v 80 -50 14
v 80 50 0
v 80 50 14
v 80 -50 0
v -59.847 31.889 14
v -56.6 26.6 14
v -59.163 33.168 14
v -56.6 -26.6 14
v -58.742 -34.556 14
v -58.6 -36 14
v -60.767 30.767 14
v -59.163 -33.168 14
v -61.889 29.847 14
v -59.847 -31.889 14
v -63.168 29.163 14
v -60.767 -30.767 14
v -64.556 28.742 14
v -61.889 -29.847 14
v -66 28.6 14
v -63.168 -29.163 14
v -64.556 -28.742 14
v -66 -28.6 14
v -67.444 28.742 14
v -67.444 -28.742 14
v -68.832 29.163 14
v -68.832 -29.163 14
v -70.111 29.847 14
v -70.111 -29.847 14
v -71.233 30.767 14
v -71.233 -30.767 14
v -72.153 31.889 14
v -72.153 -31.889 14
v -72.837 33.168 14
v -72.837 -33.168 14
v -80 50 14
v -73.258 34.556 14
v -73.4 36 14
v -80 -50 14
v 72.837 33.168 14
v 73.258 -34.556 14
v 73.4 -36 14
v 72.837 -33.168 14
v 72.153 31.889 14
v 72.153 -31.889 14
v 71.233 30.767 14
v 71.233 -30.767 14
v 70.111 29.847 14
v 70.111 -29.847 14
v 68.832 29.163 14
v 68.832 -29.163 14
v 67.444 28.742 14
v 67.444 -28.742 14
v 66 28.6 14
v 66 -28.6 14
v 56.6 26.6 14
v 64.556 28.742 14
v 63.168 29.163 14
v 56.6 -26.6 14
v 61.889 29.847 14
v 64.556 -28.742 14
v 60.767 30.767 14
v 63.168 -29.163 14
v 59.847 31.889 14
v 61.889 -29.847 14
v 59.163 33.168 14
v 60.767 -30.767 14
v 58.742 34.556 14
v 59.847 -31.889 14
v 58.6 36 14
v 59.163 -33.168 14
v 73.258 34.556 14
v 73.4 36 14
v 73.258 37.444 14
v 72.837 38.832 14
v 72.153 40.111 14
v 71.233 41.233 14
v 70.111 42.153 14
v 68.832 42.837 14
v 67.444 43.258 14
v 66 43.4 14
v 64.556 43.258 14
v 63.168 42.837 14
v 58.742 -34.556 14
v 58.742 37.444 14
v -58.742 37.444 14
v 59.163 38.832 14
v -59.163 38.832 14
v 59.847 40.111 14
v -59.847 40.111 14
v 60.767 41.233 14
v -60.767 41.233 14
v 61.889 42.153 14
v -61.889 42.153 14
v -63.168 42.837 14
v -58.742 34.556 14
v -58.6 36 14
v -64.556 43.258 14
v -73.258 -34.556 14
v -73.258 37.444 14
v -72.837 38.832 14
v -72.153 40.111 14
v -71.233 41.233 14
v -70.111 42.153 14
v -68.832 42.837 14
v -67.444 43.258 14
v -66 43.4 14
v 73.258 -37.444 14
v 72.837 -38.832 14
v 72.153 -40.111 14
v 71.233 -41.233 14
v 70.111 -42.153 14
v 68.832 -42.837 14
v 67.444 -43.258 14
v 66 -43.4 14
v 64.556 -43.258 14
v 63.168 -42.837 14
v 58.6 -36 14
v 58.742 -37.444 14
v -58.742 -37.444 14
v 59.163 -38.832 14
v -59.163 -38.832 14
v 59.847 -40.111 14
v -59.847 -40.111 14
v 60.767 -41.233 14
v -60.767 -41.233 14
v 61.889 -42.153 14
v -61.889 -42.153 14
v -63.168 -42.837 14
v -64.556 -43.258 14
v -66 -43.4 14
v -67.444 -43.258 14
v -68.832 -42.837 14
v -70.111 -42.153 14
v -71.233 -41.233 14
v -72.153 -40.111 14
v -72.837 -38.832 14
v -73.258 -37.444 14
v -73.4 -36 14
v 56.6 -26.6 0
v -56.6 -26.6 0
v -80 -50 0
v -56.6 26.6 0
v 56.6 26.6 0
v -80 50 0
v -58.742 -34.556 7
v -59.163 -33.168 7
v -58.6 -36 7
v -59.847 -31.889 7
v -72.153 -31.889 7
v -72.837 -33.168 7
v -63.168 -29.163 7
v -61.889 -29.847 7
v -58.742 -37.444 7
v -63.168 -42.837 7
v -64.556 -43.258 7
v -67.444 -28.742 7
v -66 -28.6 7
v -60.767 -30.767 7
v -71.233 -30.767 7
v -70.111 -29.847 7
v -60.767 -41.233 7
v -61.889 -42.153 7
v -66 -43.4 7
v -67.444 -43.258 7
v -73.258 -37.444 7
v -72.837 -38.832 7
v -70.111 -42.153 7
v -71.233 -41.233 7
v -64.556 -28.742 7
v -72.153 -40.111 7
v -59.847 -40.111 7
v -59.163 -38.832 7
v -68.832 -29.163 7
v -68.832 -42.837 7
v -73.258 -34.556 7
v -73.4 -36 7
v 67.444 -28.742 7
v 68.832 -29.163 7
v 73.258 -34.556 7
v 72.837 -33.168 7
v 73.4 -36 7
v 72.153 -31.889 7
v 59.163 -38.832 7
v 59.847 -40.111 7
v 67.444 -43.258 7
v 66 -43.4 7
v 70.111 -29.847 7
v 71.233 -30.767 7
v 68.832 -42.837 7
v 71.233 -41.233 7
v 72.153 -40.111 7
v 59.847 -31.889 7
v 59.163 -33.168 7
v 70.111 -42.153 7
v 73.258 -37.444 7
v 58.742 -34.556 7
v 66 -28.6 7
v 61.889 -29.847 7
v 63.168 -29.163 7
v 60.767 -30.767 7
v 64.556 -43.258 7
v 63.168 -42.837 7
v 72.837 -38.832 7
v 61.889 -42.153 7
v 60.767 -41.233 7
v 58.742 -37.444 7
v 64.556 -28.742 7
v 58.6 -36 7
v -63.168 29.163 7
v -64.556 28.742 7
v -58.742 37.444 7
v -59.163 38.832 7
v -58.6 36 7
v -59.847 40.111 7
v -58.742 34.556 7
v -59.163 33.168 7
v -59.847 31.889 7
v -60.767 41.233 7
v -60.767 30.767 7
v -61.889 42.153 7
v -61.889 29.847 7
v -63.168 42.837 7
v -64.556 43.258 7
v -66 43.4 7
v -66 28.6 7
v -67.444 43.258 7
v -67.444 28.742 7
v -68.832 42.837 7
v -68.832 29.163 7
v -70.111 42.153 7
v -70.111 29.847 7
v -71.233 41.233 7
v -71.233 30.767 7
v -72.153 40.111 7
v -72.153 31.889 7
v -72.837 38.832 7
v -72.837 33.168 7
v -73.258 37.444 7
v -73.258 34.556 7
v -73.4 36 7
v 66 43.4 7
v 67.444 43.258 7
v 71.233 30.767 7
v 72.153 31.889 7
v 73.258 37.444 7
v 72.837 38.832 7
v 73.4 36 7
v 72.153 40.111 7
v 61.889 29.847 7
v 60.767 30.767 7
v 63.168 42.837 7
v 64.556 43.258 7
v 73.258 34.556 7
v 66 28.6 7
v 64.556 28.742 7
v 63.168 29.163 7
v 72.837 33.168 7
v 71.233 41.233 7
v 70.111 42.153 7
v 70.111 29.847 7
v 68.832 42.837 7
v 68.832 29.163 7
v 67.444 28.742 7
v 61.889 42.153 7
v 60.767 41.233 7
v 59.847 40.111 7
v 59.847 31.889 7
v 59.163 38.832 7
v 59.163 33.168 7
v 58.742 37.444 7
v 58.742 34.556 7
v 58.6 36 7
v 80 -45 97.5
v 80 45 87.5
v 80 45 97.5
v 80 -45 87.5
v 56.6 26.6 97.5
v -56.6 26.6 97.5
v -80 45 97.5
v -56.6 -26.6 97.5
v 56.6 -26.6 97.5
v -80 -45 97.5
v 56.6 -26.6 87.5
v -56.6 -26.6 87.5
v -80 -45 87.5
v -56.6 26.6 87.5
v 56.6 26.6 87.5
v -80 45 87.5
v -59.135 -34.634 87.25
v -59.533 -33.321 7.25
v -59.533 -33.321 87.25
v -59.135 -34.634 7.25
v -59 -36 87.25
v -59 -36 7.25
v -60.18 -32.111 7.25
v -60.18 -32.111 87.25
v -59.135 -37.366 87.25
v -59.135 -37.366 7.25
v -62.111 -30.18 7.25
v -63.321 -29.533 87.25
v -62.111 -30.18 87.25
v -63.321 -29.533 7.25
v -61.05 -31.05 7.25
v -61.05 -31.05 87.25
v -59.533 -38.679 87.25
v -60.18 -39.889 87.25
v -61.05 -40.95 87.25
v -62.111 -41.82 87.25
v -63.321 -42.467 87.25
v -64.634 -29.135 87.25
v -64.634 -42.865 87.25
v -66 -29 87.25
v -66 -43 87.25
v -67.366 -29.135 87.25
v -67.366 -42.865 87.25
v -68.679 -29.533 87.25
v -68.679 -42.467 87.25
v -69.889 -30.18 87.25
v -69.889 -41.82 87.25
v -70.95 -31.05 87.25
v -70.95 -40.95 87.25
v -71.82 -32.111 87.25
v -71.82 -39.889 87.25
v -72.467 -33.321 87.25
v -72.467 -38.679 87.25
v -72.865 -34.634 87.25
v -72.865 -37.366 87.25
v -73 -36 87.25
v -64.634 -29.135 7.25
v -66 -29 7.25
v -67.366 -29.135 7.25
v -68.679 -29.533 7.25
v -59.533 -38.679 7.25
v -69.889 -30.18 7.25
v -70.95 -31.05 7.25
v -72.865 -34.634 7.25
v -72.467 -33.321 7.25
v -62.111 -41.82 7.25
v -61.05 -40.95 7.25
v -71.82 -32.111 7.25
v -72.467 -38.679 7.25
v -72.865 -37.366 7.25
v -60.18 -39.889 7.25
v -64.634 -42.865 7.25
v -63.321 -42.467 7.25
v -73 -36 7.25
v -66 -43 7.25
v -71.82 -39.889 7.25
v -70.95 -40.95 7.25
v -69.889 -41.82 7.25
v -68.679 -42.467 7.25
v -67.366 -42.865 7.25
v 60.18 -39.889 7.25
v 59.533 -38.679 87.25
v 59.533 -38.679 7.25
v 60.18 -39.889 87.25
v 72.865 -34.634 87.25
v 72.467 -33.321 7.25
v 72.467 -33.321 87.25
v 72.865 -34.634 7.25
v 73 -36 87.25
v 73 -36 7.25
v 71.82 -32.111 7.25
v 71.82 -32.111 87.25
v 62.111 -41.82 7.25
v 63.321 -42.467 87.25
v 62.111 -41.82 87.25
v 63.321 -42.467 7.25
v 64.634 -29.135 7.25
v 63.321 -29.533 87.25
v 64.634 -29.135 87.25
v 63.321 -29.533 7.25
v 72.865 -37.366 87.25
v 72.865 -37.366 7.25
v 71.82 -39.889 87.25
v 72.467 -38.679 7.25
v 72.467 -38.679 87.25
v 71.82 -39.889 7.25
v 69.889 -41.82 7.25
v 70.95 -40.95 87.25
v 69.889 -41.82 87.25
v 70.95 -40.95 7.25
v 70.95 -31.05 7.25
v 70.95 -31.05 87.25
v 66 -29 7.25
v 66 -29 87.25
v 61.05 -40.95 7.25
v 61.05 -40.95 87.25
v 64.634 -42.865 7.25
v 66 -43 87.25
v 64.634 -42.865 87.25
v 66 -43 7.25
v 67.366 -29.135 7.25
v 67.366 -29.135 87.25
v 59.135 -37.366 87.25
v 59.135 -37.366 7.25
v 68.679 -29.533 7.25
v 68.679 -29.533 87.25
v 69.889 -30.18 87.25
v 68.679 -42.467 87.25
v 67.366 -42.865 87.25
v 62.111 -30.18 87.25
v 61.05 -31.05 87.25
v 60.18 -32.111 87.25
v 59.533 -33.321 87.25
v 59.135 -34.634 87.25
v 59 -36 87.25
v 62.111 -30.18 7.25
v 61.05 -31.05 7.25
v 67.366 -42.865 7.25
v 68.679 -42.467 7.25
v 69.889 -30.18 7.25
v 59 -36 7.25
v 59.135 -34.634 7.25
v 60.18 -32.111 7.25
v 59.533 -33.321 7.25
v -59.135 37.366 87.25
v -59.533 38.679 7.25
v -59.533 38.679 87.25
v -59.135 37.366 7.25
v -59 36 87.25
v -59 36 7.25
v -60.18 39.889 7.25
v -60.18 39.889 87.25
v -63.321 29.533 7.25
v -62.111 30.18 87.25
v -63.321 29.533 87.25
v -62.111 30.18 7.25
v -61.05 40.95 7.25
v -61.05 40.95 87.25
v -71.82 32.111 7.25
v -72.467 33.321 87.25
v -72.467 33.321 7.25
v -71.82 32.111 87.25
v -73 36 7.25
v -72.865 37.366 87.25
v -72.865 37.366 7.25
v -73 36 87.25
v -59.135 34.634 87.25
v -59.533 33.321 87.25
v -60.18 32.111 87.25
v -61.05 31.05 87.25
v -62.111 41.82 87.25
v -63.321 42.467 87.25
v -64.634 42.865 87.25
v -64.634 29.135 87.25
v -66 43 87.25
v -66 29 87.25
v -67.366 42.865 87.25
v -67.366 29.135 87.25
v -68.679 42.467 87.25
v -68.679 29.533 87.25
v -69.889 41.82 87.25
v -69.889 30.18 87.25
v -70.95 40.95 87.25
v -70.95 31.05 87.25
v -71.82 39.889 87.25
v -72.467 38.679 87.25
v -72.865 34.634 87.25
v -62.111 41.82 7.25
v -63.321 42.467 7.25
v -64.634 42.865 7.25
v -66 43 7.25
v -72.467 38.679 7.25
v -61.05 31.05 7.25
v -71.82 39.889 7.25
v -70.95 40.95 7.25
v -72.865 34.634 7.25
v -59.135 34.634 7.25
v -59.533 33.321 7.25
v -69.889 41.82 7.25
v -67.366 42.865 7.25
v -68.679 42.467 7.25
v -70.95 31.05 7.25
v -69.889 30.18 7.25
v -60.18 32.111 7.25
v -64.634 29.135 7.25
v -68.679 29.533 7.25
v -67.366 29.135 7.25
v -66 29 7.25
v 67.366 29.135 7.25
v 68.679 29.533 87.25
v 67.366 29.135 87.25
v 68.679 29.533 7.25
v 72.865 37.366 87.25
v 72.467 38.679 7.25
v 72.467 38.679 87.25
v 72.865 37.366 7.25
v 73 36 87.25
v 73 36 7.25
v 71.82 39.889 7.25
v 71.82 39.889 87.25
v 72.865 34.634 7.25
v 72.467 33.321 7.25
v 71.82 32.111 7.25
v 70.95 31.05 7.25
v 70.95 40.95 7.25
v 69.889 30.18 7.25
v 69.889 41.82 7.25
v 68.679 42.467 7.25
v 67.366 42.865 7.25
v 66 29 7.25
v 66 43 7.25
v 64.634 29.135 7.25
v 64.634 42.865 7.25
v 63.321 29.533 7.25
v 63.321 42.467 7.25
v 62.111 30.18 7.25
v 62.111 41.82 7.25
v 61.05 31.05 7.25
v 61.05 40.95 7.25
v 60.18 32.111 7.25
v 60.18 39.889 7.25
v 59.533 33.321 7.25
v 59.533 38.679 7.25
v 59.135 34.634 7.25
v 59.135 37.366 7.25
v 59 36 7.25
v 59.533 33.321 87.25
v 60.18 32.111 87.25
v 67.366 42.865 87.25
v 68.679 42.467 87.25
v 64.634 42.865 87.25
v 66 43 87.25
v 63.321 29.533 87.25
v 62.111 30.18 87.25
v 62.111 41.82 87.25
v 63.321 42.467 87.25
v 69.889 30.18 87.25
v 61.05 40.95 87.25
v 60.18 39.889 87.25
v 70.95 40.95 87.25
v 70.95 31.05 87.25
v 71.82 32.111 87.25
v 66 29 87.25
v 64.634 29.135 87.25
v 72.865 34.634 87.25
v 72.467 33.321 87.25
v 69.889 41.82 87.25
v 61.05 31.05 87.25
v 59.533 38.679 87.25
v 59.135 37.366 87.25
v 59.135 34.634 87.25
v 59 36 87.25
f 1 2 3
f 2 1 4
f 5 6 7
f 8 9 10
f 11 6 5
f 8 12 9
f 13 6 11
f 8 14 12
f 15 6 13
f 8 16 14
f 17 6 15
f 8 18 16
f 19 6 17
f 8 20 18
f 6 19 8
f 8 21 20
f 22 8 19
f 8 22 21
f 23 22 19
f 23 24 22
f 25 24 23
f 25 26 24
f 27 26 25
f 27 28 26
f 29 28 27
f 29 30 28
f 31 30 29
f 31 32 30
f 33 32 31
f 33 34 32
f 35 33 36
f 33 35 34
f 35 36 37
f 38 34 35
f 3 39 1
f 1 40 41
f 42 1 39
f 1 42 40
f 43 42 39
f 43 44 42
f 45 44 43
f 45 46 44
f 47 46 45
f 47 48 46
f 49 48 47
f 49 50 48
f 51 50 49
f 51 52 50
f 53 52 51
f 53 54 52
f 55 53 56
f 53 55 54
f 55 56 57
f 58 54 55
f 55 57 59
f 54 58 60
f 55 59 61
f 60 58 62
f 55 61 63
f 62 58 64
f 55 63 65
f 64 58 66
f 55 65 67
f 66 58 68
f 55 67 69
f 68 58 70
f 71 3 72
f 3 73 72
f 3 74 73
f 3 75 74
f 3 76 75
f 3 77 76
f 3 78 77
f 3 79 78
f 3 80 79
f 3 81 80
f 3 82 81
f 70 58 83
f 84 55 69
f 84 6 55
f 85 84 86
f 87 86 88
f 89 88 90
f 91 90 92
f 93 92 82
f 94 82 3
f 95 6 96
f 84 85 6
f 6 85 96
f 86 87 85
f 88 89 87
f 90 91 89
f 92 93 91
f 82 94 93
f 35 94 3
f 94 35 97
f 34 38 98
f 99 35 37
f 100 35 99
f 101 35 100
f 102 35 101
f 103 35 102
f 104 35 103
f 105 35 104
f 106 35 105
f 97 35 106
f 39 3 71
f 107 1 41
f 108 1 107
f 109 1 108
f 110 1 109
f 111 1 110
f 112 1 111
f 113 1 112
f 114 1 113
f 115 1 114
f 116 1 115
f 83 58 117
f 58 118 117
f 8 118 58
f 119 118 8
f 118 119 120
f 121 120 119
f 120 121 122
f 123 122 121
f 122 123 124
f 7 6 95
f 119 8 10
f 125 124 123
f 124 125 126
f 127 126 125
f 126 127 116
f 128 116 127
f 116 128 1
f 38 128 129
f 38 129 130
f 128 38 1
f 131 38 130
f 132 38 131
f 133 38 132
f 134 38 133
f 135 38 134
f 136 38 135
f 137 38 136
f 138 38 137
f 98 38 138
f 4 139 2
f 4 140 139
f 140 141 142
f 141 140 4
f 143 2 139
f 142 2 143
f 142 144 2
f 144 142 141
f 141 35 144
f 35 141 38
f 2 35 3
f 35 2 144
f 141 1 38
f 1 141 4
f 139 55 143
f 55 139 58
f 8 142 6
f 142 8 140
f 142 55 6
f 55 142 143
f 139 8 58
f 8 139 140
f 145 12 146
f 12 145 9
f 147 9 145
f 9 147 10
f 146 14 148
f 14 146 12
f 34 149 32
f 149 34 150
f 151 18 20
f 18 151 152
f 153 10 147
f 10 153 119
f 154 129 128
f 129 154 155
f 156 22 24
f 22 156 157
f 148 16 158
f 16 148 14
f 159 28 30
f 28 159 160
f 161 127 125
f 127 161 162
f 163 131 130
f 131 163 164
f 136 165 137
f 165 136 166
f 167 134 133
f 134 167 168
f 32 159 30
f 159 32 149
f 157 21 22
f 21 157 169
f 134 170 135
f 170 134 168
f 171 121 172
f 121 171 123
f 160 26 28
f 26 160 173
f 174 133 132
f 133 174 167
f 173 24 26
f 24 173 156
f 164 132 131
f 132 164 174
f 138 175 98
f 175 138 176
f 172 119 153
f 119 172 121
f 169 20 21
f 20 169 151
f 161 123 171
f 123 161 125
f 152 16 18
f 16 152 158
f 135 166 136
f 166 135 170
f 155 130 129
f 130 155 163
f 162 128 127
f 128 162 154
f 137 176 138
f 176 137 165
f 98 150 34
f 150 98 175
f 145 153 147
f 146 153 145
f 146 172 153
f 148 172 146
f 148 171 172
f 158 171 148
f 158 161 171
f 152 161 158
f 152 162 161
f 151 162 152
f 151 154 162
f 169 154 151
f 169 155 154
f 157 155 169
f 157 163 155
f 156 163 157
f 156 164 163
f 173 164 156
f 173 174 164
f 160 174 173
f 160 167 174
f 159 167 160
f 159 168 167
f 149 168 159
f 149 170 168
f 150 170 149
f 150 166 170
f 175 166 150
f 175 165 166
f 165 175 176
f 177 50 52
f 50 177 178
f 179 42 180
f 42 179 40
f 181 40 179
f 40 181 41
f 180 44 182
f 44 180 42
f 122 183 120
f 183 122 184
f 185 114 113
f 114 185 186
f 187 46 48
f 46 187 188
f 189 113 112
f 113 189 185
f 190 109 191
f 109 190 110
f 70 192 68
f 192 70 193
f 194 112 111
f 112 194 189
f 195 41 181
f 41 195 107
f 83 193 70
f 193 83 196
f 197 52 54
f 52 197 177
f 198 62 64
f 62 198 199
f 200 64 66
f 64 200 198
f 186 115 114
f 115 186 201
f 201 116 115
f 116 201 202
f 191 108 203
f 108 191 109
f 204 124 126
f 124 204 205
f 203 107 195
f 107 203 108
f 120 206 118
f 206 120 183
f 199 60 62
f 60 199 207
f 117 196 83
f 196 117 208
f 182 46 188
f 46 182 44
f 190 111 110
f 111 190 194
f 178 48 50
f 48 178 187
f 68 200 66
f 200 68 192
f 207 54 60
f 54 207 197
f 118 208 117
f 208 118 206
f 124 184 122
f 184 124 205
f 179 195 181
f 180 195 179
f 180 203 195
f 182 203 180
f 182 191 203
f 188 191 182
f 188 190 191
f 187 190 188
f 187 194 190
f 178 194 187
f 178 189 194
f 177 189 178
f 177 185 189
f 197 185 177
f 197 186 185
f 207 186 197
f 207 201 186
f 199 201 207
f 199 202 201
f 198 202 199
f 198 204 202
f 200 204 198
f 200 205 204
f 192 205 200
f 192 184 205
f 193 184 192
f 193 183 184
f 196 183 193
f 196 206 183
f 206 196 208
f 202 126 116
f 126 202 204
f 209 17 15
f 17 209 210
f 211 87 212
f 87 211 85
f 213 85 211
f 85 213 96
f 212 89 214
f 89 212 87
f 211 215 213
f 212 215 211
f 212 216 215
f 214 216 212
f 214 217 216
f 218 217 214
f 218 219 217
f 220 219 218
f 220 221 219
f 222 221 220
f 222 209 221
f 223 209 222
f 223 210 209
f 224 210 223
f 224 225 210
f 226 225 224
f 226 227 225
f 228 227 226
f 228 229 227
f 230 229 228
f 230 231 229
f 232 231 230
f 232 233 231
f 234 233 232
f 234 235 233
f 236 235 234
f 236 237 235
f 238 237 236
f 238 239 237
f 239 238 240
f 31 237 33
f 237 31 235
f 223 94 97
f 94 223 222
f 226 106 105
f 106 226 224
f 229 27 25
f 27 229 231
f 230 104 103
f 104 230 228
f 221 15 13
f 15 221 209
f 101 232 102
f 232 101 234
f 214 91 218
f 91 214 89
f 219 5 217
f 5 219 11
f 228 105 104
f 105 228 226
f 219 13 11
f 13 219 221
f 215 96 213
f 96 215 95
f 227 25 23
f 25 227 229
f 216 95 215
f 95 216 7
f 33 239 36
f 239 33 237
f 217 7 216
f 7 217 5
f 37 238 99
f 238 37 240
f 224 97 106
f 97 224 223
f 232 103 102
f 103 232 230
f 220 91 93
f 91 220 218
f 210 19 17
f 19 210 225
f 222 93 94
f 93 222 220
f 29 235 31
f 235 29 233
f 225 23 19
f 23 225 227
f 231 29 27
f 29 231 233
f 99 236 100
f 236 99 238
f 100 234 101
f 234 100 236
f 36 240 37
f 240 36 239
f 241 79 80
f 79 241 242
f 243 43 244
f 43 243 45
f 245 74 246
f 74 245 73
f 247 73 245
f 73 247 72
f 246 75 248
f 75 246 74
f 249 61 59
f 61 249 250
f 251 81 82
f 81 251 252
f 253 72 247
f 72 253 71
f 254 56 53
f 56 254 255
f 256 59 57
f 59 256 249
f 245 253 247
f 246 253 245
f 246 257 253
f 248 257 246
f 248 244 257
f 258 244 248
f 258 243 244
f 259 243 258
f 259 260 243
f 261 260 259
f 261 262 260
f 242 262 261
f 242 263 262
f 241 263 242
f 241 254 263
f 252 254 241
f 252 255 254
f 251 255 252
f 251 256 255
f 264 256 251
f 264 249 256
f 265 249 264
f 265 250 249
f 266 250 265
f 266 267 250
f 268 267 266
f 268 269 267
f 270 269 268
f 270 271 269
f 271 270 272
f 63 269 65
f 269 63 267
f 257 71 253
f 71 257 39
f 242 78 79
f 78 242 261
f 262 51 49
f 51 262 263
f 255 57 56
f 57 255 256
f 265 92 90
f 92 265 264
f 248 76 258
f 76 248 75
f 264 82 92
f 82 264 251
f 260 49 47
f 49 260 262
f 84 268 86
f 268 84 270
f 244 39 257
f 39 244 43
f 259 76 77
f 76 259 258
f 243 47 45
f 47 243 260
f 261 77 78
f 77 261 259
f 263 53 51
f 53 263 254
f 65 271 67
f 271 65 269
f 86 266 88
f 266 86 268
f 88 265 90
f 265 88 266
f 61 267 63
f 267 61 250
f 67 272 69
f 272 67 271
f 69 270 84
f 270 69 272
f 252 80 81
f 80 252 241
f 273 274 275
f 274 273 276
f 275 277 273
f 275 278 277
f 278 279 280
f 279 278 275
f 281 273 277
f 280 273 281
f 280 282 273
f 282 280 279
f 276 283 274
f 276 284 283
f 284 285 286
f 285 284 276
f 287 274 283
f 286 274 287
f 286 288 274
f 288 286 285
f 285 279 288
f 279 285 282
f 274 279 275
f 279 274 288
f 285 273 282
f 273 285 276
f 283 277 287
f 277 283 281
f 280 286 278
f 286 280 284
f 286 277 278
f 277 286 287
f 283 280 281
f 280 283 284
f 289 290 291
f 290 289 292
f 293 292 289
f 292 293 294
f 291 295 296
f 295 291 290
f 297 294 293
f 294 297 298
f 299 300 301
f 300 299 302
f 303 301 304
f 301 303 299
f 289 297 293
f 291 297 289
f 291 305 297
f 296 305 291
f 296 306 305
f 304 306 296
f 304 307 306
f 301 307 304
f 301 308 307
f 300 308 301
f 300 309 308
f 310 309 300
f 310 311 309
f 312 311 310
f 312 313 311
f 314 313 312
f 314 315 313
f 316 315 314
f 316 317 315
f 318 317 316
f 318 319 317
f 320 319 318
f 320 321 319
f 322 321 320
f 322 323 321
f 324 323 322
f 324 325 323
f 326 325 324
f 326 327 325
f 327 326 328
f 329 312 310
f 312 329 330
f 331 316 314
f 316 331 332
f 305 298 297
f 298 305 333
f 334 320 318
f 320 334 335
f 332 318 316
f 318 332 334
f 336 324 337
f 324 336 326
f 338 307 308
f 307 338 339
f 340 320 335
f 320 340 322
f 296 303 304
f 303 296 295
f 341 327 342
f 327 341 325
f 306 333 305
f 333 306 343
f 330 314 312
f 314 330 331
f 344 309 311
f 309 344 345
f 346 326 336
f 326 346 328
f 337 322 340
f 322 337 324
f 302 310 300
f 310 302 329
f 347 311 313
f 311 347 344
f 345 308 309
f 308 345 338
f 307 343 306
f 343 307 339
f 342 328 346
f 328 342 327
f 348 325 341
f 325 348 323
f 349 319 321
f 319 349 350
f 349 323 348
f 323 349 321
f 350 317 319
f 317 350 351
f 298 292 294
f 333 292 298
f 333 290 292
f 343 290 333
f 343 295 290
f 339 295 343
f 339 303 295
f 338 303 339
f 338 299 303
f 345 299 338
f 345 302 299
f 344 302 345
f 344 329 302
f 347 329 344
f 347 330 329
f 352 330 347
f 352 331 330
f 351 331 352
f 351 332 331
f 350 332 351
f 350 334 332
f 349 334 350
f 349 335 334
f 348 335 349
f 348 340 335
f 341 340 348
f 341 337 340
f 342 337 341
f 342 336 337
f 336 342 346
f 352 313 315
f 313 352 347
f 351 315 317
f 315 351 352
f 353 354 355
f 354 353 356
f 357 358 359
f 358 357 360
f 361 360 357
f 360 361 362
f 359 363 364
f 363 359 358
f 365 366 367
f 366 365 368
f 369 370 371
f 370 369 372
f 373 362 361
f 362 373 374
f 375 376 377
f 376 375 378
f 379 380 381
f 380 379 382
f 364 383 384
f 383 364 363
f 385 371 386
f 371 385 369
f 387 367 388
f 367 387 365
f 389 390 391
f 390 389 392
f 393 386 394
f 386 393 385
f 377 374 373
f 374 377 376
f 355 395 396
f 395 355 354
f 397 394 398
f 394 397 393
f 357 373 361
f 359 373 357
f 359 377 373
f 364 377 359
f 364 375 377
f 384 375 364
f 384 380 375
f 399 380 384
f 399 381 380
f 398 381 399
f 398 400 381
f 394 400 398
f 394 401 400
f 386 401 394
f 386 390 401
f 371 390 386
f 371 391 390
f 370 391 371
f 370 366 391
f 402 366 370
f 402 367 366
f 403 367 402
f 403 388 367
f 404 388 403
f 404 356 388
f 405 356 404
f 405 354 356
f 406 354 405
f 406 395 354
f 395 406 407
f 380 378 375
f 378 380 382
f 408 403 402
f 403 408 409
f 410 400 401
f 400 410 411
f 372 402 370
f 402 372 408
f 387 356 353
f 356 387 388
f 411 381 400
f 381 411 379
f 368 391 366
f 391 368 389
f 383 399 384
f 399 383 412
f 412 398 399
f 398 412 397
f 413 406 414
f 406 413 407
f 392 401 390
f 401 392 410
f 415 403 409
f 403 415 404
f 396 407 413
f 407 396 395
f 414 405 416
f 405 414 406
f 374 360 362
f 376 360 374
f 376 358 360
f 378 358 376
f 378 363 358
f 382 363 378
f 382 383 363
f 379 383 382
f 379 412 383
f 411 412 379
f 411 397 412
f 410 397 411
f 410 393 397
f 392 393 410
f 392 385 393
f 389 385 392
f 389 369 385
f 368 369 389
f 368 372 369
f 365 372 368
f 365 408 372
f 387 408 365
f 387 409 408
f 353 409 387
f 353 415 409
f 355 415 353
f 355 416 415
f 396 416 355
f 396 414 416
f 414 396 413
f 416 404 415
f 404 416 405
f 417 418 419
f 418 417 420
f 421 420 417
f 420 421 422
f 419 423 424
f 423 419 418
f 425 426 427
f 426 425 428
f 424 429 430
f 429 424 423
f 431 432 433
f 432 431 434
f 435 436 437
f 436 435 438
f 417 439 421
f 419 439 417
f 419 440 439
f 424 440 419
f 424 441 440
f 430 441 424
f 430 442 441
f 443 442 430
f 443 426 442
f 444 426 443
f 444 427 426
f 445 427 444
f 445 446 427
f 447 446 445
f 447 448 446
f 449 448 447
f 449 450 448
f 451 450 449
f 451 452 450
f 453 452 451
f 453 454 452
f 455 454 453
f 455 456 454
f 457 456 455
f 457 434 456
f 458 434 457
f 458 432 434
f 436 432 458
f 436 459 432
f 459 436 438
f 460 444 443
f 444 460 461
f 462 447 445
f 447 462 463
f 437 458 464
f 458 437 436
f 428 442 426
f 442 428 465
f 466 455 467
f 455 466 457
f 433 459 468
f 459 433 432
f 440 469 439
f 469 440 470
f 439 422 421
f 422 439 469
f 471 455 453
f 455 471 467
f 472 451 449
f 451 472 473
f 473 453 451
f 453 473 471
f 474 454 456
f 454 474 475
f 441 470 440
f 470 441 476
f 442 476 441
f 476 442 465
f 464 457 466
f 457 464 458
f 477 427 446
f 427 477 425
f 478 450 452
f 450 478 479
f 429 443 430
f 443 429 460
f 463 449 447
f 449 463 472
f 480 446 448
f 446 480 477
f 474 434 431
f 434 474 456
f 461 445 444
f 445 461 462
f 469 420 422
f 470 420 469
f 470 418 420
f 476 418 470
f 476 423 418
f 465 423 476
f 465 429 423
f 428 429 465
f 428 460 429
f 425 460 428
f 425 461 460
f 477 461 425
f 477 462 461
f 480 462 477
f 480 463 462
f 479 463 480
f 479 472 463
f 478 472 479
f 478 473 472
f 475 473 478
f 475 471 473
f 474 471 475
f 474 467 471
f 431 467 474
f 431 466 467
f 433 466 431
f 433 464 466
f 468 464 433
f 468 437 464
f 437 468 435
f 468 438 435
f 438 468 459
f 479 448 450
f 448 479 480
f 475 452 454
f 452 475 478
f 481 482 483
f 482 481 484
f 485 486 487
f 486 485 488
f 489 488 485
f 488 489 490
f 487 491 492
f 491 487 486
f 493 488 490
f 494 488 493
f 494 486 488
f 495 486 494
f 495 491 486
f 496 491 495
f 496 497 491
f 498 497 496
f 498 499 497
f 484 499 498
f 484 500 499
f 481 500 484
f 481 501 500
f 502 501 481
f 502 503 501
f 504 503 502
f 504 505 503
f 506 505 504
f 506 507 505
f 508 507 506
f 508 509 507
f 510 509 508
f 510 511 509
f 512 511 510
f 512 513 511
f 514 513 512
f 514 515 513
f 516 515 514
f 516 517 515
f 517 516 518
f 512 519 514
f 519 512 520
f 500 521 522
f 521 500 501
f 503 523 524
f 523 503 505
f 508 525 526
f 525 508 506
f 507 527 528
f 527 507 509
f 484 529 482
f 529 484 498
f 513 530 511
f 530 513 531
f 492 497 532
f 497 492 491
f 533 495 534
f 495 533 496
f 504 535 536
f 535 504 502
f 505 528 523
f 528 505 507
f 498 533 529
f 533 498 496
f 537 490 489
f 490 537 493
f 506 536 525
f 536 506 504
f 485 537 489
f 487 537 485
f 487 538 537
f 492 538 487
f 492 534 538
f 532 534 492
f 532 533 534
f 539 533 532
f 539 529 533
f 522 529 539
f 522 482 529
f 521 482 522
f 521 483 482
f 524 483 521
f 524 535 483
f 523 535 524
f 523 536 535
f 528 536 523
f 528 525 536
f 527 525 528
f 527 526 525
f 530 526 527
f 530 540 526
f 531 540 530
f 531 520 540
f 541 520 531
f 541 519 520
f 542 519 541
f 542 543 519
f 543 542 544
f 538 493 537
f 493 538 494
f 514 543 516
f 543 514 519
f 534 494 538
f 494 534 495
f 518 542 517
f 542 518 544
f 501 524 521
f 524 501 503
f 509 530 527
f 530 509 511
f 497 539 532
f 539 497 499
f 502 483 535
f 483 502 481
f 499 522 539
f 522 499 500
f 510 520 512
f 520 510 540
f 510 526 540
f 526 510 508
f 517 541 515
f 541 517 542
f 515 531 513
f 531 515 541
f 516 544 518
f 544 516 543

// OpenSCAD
$fn = 32;

// ------------------------------------------------------------------------
// Frame cube: base 160 x 100 mm, posts 80 mm tall
// Every part is its own module, assembly() places every instance.
// ------------------------------------------------------------------------

// --- part 1 ---
module base_frame() {
  difference() {
    translate([-80, -50, 0]) cube([160, 100, 14]);
    translate([-56.6, -26.6, -1]) cube([113.2, 53.2, 16]);
    translate([-66, -36, 7]) cylinder(h = 8, d = 14.8);
    translate([66, -36, 7]) cylinder(h = 8, d = 14.8);
    translate([-66, 36, 7]) cylinder(h = 8, d = 14.8);
    translate([66, 36, 7]) cylinder(h = 8, d = 14.8);
  }
}

// --- part 2 ---
module corner_post() {
  cylinder(h = 80, d = 14);
}

// --- part 3 ---
module top_frame() {
  difference() {
    translate([-80, -45, 0]) cube([160, 90, 10]);
    translate([-56.6, -26.6, -1]) cube([113.2, 53.2, 12]);
  }
}

// --- assembly ---
module assembly() {
  color([0.80, 0.24, 0.20]) translate([0, 0, 0]) rotate([0, 0, 0]) base_frame();
  color([0.20, 0.45, 0.75]) translate([-66, -36, 7.25]) rotate([0, 0, 0]) corner_post();
  color([0.25, 0.62, 0.32]) translate([66, -36, 7.25]) rotate([0, 0, 0]) corner_post();
  color([0.92, 0.70, 0.18]) translate([-66, 36, 7.25]) rotate([0, 0, 0]) corner_post();
  color([0.58, 0.35, 0.70]) translate([66, 36, 7.25]) rotate([0, 0, 0]) corner_post();
  color([0.16, 0.66, 0.66]) translate([0, 0, 87.5]) rotate([0, 0, 0]) top_frame();
}

assembly();
